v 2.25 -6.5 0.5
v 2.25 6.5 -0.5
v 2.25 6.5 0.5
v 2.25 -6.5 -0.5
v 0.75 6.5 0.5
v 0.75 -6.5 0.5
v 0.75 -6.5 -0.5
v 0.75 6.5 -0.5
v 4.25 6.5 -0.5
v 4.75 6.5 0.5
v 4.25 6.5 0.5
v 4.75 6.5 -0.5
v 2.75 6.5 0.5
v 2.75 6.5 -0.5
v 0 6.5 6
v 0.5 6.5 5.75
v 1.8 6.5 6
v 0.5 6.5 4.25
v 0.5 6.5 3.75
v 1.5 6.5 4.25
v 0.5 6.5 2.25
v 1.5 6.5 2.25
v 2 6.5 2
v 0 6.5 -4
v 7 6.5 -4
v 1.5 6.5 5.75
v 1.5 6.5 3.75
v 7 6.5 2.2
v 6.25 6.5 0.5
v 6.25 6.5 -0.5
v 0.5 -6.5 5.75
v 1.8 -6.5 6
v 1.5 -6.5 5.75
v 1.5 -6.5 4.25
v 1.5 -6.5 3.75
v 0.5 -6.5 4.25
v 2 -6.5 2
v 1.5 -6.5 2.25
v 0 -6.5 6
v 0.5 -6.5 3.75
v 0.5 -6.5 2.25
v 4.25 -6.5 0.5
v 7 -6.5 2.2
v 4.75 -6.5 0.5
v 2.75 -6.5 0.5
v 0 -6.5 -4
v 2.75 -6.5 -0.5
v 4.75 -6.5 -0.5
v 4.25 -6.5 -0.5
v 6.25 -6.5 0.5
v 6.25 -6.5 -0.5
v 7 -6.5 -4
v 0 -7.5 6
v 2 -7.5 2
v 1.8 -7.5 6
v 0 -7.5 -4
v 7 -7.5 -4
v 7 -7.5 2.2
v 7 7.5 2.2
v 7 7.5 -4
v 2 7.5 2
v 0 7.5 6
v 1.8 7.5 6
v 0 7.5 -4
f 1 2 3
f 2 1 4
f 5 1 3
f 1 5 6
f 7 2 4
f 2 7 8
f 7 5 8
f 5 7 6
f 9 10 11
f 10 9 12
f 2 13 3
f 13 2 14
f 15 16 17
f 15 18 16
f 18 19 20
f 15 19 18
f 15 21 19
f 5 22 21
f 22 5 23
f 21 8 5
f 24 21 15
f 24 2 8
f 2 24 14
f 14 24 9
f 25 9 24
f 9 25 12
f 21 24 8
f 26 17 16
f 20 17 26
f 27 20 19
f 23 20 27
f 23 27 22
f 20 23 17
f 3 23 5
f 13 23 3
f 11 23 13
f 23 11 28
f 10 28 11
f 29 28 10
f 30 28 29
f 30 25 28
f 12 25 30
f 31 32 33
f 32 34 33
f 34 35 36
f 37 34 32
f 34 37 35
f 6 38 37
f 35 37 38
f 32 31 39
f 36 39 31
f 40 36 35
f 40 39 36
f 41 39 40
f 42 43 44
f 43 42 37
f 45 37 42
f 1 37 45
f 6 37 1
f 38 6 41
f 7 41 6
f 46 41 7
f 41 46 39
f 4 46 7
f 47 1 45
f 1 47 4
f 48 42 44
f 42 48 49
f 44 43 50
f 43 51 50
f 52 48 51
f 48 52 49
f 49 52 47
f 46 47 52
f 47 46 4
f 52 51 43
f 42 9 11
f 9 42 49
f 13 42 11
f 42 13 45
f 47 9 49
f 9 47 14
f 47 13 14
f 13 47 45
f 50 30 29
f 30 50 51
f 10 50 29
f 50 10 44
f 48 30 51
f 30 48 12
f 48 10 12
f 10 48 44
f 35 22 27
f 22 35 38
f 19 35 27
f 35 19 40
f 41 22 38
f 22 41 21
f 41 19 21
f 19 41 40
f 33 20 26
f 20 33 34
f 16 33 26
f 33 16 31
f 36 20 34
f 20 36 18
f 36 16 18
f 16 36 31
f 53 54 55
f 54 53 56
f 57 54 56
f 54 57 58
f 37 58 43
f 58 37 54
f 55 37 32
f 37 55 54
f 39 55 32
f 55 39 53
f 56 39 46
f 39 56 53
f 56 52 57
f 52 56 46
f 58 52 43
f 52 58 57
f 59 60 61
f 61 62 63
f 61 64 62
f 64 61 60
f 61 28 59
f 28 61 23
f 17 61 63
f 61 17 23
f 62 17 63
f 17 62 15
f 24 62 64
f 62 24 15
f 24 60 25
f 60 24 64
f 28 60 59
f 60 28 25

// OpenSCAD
// #linear_extrude(7, scale = 1, center = true)

module Bench_01(){

    color("gray")
    translate([0,-7,0])
    rotate([90,0,0])
    linear_extrude(1, scale = 1, center = true)
    polygon(points=[[0,-4],[7,-4],[7,2.2],[2,2],[1.8,6],[0,6]]);
             
    translate([0,7,0])    
    color("gray")
    rotate([90,0,0])
    linear_extrude(1, scale = 1, center = true)
    polygon(points=[[0,-4],[7,-4],[7,2.2],[2,2],[1.8,6],[0,6]]);     

    color("#c69874"){
    translate([1.5,0,0]) 
    cube([1.5,13,1], center = true);

    translate([3.5,0,0]) 
    cube([1.5,13,1], center = true);

    translate([5.5,0,0]) 
    cube([1.5,13,1], center = true);


    translate([1,0,3]) 
    cube([1,13,1.5], center = true);

    translate([1,0,5]) 
    cube([1,13,1.5], center = true);
    }

}


Bench_01();
